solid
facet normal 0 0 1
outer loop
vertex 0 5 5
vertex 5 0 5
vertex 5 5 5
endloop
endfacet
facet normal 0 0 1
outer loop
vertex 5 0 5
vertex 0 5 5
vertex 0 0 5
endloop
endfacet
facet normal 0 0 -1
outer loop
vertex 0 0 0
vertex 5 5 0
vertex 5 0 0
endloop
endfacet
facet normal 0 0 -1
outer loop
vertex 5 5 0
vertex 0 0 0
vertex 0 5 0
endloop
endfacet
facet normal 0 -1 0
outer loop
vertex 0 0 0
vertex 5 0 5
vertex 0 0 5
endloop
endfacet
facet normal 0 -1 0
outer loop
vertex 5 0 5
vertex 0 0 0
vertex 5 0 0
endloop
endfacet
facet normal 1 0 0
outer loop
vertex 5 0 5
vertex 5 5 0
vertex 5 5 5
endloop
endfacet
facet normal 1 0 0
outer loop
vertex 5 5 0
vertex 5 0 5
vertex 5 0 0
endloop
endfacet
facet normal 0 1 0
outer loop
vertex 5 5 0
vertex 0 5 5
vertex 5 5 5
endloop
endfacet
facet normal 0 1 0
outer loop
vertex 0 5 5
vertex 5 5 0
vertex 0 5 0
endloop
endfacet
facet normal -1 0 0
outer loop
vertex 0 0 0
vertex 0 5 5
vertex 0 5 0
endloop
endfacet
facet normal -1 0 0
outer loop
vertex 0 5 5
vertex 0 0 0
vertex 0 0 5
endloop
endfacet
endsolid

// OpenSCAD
// cube(size = [x, y, z], center = true/false);

cube([5, 5, 5]);

// EOF
